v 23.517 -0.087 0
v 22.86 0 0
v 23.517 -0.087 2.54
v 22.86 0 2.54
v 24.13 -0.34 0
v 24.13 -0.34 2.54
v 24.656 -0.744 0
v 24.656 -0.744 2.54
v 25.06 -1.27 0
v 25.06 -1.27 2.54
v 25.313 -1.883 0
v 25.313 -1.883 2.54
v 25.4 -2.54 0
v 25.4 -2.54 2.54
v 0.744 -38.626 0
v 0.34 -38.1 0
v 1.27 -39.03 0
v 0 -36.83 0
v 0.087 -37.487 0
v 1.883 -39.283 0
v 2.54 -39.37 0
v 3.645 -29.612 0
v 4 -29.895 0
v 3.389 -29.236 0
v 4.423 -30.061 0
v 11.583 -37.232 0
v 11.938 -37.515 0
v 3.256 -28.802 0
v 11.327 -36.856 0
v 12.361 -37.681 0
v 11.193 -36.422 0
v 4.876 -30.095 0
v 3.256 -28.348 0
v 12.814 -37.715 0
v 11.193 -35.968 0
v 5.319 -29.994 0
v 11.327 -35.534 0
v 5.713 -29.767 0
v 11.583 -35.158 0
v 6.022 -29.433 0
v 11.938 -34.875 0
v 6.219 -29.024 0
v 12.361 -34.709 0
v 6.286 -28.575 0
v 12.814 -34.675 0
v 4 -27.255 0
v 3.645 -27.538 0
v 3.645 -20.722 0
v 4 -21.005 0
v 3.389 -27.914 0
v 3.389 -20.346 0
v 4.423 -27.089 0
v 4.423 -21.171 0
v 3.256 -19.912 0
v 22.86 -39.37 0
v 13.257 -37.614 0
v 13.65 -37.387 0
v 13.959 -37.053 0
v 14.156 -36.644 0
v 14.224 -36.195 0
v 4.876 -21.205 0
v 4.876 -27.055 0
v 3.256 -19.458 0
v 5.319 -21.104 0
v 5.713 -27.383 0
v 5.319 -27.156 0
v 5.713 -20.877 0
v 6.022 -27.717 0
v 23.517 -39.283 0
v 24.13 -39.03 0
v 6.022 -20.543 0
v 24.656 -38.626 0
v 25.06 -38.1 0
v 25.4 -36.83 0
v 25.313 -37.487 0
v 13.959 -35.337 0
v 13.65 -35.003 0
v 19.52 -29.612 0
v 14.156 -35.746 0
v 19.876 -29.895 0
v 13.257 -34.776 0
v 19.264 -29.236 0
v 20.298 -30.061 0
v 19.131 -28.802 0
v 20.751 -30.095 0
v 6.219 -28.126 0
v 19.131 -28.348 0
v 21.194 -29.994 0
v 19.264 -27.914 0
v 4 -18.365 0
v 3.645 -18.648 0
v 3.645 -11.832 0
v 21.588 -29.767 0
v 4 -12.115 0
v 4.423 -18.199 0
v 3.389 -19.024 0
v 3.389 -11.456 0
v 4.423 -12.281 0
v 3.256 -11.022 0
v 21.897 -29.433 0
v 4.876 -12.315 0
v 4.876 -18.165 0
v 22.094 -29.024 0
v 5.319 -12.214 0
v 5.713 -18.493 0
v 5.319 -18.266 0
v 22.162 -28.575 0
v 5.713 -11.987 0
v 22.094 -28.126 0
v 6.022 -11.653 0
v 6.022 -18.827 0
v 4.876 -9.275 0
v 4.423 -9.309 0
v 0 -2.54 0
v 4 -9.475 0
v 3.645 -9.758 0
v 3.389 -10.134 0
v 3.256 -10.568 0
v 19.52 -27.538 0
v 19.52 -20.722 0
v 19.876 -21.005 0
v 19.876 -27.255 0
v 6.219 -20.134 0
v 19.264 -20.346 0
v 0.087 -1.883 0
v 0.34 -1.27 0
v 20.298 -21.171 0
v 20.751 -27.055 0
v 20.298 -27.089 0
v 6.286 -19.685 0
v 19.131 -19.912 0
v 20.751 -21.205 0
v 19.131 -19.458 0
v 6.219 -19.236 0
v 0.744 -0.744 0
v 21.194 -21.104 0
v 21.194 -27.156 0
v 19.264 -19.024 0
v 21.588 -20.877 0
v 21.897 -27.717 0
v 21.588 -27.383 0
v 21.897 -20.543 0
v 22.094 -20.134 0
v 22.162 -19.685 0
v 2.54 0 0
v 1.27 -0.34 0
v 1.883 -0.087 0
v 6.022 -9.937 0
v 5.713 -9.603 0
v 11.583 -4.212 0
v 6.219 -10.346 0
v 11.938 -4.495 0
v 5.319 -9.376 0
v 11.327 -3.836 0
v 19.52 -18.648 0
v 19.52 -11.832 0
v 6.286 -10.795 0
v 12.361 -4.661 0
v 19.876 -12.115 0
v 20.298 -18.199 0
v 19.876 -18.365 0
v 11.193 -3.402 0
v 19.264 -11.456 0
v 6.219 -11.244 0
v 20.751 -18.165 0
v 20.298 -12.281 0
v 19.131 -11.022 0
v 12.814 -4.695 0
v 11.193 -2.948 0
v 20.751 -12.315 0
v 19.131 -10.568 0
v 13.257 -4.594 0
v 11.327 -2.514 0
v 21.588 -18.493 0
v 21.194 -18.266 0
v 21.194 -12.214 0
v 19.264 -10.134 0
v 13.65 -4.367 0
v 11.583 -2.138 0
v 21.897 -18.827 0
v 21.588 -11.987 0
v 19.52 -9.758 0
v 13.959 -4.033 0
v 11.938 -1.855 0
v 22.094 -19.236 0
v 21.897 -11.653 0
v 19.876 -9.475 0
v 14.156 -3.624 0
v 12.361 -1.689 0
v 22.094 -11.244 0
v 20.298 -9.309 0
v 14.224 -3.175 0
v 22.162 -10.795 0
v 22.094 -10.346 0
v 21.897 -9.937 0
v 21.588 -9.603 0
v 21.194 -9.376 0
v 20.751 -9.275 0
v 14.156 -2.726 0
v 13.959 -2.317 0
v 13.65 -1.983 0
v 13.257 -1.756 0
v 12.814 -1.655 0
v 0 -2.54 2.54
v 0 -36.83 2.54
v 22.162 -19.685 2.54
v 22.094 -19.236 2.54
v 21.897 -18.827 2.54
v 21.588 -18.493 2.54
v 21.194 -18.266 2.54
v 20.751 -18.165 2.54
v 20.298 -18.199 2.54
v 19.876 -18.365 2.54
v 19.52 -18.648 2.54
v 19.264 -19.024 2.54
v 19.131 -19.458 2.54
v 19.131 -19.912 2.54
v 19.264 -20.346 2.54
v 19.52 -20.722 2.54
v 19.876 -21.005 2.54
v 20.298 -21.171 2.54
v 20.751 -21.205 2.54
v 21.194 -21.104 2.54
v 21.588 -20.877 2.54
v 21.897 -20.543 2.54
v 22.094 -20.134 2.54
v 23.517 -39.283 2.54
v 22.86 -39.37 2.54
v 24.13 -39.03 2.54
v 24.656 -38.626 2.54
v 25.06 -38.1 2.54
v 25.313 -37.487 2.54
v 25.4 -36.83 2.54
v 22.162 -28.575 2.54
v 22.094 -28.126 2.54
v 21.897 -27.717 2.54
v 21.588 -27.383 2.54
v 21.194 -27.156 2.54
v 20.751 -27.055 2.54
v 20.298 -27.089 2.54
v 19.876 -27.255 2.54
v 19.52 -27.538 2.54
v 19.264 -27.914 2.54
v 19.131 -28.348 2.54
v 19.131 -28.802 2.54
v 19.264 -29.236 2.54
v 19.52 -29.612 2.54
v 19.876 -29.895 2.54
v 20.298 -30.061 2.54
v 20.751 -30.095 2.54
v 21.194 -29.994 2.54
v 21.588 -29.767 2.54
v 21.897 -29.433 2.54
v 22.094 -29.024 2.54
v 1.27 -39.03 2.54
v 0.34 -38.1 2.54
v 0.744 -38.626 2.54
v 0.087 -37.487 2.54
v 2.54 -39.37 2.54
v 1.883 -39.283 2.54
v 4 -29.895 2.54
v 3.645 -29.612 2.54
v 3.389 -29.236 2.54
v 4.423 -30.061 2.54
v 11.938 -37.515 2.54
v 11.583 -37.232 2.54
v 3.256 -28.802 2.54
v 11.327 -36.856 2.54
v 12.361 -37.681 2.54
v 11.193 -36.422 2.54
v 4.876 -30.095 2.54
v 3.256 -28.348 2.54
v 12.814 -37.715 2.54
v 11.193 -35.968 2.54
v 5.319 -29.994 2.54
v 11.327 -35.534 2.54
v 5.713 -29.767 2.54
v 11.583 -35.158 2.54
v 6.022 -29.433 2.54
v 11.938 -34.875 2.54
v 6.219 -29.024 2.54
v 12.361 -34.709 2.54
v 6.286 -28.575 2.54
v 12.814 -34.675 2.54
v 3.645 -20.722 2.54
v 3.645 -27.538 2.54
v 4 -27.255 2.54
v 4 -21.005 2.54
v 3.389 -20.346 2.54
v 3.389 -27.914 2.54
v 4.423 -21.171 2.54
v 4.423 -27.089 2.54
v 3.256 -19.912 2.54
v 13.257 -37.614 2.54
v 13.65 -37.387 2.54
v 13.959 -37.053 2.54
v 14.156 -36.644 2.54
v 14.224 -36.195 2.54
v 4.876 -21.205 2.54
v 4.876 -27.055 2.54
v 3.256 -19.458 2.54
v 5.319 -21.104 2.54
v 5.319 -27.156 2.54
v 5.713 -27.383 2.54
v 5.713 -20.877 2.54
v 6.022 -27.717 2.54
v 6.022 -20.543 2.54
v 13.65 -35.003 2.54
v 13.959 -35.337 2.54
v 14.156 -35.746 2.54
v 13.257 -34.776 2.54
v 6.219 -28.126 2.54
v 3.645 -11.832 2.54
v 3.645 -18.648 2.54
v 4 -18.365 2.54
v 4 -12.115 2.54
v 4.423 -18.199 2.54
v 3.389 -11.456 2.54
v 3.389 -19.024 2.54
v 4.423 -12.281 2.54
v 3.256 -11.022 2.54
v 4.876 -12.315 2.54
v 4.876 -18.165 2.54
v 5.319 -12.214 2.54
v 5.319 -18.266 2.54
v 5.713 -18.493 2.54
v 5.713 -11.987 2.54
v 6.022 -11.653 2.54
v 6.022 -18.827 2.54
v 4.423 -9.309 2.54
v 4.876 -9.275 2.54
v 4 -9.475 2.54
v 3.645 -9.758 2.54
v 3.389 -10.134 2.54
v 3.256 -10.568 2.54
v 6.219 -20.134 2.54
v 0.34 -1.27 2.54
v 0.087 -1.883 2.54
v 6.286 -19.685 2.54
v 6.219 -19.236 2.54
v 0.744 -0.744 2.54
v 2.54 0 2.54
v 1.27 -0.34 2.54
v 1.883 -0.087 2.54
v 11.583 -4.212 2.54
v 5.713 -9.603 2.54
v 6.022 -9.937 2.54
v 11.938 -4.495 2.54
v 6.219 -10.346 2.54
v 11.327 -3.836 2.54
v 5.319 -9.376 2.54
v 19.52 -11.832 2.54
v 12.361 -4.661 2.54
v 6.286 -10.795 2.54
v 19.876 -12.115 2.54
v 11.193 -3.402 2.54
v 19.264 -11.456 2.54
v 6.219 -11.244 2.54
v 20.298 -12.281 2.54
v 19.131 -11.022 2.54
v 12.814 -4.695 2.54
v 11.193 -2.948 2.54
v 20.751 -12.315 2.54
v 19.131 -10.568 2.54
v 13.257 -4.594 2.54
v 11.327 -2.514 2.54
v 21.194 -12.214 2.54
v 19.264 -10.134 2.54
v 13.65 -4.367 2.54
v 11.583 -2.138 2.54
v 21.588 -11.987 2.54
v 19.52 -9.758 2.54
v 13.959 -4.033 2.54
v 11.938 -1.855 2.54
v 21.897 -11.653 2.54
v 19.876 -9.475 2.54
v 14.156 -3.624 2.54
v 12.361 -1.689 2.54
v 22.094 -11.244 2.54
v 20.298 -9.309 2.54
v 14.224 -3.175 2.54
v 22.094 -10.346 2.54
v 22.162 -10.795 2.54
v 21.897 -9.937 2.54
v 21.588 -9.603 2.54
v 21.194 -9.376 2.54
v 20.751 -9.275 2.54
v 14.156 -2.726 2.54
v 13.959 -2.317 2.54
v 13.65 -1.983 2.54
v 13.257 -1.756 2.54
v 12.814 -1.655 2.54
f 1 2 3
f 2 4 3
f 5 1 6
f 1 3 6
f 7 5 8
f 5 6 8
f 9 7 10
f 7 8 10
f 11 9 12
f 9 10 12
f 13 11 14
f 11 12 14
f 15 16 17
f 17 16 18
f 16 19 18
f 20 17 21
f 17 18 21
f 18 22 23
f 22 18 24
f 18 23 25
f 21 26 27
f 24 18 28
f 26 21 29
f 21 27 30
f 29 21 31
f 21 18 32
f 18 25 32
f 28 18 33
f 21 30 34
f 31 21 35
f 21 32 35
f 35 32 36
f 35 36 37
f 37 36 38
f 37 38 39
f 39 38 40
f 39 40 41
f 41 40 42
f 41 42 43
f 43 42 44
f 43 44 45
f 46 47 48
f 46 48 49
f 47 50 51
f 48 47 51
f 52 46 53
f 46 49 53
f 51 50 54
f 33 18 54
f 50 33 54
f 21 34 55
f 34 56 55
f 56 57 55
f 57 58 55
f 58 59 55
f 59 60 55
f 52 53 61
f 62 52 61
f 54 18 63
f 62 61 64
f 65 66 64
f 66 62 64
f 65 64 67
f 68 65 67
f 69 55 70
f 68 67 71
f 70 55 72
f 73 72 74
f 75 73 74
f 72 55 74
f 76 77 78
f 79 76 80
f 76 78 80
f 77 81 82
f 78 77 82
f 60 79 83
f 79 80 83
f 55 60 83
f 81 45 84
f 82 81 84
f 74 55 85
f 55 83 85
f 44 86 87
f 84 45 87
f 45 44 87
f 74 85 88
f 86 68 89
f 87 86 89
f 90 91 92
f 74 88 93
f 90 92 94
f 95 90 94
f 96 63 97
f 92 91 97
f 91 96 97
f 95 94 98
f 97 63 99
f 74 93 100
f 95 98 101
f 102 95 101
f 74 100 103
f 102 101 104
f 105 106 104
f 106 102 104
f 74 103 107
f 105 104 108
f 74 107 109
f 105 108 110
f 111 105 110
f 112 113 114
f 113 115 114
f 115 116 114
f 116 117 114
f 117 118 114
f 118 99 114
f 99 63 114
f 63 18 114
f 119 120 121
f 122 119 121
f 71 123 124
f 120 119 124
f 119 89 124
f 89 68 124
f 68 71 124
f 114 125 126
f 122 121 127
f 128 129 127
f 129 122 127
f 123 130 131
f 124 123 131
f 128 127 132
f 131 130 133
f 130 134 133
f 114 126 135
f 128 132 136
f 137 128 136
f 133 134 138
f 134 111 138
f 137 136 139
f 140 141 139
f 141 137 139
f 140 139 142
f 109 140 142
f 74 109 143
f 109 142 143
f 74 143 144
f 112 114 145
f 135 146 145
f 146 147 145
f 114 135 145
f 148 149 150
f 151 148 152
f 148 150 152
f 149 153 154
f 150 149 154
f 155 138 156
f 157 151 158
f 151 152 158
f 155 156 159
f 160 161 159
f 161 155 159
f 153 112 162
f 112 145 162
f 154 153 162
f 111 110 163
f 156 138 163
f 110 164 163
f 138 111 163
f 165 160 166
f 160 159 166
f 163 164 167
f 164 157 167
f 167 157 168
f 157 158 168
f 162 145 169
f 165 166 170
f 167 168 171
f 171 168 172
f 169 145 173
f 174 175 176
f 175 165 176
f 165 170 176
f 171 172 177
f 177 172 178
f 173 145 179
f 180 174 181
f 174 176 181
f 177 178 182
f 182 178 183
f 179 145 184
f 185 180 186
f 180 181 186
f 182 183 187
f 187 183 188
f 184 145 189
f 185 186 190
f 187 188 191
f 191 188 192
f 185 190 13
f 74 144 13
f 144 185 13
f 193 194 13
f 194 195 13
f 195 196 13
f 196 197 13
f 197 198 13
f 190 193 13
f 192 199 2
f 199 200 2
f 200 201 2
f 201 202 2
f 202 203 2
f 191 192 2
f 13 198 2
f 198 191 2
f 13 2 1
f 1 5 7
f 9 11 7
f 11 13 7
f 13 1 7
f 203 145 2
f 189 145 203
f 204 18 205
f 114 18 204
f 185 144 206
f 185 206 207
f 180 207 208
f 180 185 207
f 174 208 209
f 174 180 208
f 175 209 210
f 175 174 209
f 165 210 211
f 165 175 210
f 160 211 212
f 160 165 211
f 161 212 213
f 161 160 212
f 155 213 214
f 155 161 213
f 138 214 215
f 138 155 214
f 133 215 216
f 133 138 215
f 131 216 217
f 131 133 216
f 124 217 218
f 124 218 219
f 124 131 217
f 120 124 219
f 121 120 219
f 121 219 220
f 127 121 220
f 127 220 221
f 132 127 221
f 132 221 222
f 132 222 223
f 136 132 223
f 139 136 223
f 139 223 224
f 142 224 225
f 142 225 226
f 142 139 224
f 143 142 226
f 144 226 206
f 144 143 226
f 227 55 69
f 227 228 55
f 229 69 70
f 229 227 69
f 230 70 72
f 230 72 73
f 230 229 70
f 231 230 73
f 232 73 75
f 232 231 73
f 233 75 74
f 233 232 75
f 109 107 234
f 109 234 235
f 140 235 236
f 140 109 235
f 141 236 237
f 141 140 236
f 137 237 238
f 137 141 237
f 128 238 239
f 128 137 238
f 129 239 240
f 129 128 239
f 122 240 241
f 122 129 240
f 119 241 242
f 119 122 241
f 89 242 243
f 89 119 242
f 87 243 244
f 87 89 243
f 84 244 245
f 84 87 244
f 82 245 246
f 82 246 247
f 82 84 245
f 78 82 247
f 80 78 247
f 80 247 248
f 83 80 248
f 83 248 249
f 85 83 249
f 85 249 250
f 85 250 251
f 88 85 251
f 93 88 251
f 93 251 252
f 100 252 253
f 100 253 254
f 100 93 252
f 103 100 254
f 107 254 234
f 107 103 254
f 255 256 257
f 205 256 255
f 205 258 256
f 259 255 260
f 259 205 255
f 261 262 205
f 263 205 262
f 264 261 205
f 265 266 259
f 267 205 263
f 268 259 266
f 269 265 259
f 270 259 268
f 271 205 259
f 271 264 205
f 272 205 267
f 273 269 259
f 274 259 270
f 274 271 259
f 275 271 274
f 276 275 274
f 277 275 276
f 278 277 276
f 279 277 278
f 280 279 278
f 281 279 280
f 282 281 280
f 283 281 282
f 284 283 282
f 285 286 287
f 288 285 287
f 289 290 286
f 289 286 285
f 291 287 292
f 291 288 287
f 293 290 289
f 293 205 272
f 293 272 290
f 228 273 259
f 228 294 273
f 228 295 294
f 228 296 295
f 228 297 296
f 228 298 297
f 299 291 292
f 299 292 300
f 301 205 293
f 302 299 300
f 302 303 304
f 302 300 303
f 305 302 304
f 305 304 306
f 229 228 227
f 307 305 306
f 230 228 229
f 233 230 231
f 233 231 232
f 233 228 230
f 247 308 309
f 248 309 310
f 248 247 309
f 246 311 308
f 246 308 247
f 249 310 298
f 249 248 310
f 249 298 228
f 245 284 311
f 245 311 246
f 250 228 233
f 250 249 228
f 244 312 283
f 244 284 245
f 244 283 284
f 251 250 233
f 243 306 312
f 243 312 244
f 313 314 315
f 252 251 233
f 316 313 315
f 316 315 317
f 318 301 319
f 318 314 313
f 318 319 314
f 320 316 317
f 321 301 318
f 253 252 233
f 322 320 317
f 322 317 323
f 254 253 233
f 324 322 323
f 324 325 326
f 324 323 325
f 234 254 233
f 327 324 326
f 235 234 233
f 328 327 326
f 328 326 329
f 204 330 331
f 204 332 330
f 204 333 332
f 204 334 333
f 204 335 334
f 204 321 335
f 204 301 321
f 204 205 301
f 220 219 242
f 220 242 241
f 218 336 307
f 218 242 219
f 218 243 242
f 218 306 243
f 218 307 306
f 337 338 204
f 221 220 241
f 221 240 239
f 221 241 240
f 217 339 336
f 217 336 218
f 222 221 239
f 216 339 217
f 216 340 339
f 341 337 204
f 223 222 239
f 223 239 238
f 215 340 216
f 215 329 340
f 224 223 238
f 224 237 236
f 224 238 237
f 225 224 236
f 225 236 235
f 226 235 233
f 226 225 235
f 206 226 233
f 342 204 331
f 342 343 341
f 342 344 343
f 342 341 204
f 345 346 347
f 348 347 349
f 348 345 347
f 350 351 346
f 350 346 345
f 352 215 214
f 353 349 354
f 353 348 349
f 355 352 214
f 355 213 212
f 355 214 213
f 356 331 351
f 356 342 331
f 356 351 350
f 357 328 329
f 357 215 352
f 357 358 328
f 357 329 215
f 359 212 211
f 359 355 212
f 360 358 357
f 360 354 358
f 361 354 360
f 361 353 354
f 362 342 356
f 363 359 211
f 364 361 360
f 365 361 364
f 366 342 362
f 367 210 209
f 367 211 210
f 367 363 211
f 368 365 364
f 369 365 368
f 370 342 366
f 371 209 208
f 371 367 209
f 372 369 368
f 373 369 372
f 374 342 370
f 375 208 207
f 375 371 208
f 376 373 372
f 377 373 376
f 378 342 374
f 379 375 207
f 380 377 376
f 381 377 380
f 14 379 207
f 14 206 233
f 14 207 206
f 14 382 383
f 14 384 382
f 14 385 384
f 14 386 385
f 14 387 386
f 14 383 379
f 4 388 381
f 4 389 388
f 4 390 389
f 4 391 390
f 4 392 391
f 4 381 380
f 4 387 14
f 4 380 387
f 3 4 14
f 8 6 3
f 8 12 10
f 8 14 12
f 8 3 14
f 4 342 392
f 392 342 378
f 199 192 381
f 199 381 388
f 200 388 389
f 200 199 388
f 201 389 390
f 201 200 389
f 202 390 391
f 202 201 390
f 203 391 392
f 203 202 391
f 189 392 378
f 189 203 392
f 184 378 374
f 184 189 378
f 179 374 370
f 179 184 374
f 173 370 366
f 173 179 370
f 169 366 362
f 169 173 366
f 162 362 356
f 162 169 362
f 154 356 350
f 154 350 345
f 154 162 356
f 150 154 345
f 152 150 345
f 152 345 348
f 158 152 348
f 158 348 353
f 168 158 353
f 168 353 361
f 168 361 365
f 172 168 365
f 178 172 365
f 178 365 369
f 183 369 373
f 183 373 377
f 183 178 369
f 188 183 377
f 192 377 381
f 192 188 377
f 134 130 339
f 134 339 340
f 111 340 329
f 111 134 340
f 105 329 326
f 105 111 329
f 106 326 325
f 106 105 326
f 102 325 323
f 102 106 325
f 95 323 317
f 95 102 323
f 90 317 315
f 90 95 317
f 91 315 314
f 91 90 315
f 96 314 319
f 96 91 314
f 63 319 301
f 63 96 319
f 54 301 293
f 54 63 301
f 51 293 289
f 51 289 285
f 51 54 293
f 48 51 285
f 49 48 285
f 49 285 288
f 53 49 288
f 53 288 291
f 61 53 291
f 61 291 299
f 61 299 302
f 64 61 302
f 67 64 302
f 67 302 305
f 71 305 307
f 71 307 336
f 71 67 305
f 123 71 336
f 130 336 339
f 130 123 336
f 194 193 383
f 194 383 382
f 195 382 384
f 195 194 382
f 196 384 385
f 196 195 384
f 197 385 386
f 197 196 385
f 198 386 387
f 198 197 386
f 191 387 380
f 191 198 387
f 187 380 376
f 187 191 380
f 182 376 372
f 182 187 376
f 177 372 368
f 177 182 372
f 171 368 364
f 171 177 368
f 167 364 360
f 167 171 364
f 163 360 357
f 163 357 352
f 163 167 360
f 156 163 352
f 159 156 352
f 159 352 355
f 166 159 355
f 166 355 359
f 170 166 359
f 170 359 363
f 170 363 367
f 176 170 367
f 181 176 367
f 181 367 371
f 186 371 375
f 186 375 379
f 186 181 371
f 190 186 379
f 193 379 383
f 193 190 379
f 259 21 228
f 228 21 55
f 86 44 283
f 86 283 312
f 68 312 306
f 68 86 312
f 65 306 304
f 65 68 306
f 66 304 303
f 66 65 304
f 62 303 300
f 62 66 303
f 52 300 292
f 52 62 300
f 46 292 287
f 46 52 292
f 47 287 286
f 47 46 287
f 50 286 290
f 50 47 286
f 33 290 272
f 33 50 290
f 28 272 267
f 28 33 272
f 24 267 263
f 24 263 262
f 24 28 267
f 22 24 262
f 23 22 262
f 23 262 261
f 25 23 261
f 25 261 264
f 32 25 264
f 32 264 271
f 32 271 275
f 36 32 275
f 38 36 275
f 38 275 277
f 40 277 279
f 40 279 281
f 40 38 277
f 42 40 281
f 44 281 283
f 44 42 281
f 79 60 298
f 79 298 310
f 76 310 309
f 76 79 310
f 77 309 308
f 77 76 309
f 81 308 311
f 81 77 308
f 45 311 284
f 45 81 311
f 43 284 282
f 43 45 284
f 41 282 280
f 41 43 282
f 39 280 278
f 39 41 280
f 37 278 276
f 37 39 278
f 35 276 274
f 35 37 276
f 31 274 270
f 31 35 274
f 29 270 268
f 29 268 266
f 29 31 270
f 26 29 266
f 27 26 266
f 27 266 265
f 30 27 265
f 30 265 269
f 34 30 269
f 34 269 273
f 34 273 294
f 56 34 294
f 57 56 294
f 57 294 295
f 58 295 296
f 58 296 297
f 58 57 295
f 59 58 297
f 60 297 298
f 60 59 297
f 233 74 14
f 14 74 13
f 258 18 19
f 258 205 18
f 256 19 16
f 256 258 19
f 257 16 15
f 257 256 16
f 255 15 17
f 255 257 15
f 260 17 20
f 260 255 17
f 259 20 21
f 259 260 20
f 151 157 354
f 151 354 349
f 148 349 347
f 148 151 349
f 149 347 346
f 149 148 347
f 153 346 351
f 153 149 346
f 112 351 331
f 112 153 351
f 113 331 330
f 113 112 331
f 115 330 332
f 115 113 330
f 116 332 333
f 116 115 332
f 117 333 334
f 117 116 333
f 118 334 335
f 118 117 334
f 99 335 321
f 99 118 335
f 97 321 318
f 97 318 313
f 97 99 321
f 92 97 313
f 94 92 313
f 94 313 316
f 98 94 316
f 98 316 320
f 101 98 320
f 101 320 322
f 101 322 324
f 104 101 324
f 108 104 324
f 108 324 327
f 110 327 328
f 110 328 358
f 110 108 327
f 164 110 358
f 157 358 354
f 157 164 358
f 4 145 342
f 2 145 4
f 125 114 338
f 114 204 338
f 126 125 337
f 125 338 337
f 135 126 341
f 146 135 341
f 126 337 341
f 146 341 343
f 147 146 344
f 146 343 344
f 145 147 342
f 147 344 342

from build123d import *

# Parameters (mm, degrees)
SKETCH1_W           = 25.4
SKETCH1_H           = 39.37
SKETCH1_R           = 1.524
BOSS_EXTRUDE1_DEPTH = 2.54
FILLET1_R           = 2.54


with BuildPart() as part:
    # Sketch1 → Boss-Extrude1 (new body)
    with BuildSketch(Plane.XY):
        with Locations((12.7, -19.685)):
            Rectangle(SKETCH1_W, SKETCH1_H)
        with Locations((4.7625, -19.685)):
            Circle(SKETCH1_R, mode=Mode.SUBTRACT)
        with Locations((20.6375, -19.685)):
            Circle(SKETCH1_R, mode=Mode.SUBTRACT)
        with Locations((4.7625, -10.795)):
            Circle(SKETCH1_R, mode=Mode.SUBTRACT)
        with Locations((20.6375, -10.795)):
            Circle(SKETCH1_R, mode=Mode.SUBTRACT)
        with Locations((4.7625, -28.575)):
            Circle(SKETCH1_R, mode=Mode.SUBTRACT)
        with Locations((20.6375, -28.575)):
            Circle(SKETCH1_R, mode=Mode.SUBTRACT)
        with Locations((12.7, -3.175)):
            Circle(SKETCH1_R, mode=Mode.SUBTRACT)
        with Locations((12.7, -36.195)):
            Circle(SKETCH1_R, mode=Mode.SUBTRACT)
    extrude(amount=BOSS_EXTRUDE1_DEPTH)

    # Fillet1
    fillet1_edges = [part.edges().sort_by_distance(p)[0] for p in [
        (0, 0, 1.27),
        (25.4, 0, 1.27),
        (25.4, -39.37, 1.27),
        (0, -39.37, 1.27),
    ]]
    fillet(fillet1_edges, radius=FILLET1_R)


solid = part.part
